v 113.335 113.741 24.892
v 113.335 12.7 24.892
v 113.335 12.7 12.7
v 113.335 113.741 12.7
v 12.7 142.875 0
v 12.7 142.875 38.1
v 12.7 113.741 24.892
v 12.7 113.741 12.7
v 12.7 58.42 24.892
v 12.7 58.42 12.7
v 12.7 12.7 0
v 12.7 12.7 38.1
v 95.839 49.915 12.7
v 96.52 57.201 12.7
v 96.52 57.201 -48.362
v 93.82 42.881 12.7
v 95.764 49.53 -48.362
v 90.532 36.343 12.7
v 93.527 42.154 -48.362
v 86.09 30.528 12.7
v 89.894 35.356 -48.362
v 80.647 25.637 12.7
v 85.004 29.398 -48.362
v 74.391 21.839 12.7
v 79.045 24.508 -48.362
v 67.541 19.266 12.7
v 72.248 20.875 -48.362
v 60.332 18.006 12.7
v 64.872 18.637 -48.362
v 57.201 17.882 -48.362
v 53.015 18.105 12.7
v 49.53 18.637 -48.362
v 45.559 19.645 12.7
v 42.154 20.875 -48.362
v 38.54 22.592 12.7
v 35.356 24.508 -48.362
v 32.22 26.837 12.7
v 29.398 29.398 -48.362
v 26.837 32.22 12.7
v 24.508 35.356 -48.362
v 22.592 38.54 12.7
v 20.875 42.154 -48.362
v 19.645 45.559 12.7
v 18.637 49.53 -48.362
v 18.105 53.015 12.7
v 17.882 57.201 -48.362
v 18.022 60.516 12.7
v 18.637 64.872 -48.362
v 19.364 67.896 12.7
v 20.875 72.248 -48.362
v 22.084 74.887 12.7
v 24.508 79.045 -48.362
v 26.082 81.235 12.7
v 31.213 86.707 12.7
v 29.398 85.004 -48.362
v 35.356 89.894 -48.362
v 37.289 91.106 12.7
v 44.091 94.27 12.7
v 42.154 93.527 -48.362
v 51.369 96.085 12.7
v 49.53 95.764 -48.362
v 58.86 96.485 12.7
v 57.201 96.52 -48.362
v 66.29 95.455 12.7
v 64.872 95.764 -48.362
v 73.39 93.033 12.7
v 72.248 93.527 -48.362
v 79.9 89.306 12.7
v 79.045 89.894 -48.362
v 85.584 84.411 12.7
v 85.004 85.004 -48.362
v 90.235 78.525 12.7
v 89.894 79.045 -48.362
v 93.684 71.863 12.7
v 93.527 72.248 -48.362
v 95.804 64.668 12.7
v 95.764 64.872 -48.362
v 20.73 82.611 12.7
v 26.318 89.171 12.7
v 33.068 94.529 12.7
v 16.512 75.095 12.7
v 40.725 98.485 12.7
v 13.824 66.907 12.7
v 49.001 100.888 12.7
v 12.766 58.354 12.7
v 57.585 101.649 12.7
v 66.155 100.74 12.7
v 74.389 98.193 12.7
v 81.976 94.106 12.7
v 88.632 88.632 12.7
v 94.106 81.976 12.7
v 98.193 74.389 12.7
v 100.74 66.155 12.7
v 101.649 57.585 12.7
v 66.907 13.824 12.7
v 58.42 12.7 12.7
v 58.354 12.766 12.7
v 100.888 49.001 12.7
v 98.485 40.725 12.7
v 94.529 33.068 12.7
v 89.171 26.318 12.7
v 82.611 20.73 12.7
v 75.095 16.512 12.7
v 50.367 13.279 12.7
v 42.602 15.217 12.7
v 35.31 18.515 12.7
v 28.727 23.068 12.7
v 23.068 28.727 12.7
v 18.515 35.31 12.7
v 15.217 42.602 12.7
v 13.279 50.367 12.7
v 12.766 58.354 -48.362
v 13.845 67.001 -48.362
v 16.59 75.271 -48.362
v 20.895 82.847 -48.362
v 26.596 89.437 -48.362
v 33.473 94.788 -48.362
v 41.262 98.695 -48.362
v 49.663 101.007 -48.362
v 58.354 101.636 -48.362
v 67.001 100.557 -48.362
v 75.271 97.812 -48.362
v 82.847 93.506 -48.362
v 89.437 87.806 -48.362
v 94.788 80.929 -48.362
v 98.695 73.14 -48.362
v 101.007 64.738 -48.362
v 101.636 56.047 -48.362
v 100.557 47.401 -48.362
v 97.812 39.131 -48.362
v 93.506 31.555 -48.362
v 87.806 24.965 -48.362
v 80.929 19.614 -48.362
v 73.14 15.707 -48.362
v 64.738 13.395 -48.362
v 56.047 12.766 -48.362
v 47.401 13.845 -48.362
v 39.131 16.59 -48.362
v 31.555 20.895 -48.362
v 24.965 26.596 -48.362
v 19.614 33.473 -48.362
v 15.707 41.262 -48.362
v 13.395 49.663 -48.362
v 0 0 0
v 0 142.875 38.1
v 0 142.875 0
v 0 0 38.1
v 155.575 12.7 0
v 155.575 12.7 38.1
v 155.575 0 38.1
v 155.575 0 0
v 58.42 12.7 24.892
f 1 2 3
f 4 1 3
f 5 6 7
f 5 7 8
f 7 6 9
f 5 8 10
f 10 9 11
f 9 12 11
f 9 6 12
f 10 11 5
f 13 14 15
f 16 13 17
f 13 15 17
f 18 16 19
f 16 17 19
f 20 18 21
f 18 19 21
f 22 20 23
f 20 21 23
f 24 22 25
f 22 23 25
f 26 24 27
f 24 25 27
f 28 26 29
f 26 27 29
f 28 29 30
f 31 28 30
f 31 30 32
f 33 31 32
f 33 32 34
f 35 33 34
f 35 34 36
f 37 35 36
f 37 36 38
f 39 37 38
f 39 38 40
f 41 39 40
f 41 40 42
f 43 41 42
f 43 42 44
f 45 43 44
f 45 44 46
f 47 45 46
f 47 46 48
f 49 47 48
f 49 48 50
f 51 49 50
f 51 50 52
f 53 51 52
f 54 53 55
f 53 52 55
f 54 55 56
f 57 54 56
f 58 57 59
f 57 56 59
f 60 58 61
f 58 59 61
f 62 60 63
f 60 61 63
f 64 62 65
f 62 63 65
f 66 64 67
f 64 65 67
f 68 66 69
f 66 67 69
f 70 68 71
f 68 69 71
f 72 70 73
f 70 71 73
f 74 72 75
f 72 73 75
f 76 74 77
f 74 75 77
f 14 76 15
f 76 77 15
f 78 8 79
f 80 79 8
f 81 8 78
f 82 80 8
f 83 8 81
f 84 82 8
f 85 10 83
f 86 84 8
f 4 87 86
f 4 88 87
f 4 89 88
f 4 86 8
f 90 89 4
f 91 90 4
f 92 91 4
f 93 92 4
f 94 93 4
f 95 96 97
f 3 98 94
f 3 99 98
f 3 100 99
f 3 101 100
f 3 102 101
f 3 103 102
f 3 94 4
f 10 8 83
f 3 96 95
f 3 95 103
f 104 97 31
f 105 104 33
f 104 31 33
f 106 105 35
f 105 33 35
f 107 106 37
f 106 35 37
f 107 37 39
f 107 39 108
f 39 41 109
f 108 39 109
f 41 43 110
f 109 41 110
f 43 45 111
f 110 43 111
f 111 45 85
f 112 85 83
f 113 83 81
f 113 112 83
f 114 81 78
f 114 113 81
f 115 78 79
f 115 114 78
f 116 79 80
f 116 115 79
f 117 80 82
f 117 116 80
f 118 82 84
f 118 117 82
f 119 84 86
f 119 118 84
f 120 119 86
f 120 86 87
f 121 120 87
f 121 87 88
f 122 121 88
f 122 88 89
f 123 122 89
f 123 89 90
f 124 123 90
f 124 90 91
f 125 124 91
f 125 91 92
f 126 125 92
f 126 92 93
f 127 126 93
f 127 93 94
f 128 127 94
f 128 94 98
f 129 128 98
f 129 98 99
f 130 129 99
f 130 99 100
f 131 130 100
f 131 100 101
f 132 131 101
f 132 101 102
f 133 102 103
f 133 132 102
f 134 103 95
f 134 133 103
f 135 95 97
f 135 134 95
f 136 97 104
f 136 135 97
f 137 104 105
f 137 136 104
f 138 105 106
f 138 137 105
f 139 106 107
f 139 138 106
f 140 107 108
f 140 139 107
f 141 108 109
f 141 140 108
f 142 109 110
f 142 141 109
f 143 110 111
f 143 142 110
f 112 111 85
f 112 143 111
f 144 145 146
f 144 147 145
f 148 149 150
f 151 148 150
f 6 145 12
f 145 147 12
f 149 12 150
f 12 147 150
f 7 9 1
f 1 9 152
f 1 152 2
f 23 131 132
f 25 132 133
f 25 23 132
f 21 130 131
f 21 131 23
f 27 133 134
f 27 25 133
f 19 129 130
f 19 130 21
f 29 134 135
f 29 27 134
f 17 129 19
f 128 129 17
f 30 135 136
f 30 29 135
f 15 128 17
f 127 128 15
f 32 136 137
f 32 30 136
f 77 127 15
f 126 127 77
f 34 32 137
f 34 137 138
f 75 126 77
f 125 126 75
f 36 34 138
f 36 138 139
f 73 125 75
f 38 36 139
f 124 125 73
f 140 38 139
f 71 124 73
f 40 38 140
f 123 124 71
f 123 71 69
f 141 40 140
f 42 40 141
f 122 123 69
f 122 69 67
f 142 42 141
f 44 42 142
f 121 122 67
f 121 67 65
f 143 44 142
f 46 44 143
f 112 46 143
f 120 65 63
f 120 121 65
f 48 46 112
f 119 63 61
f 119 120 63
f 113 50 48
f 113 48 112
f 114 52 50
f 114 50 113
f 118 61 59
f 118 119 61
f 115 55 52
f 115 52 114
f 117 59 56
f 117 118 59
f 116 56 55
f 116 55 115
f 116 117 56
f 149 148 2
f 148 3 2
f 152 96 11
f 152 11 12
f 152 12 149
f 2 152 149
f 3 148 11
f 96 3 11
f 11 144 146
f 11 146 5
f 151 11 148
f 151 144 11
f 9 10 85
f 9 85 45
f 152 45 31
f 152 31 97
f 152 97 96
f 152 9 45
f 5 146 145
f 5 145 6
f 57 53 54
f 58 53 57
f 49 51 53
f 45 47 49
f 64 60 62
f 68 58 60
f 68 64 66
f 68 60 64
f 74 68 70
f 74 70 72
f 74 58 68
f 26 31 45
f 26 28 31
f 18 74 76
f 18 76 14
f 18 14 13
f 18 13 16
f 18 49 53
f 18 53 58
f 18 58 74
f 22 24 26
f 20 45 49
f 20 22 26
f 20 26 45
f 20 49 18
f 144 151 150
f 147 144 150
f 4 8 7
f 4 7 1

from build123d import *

# Parameters (mm, degrees)
SKETCH1_W           = 12.7
SKETCH1_H           = 38.1
BOSS_EXTRUDE1_DEPTH = 155.575
SKETCH3_W           = 12.7
SKETCH3_H           = 38.1
BOSS_EXTRUDE2_DEPTH = 130.175
SKETCH4_W           = 100.6348
SKETCH4_H           = 12.192
BOSS_EXTRUDE3_DEPTH = 101.0412
CUT_EXTRUDE2_DEPTH  = 12.192
BOSS_EXTRUDE8_START = 61.0616
SKETCH6_R           = 44.45
SKETCH6_R_2         = 39.3192
BOSS_EXTRUDE8_DEPTH = 61.0616


with BuildPart() as part:
    # Sketch1 → Boss-Extrude1 (new body)
    with BuildSketch(Plane(origin=(0, 0, 0), x_dir=(0, -1, 0), z_dir=(-1, 0, 0))):
        with Locations((-6.35, 19.05)):
            Rectangle(SKETCH1_W, SKETCH1_H)
    extrude(amount=-BOSS_EXTRUDE1_DEPTH)

    # Sketch3 → Boss-Extrude2 (add)
    with BuildSketch(Plane(origin=(0, 12.7, 0), x_dir=(1, 0, 0), z_dir=(0, 1, 0))):
        with Locations((6.35, -19.05)):
            Rectangle(SKETCH3_W, SKETCH3_H)
    extrude(amount=BOSS_EXTRUDE2_DEPTH)

    # Sketch4 → Boss-Extrude3 (add)
    with BuildSketch(Plane(origin=(0, 12.7, 0), x_dir=(1, 0, 0), z_dir=(0, 1, 0))):
        with Locations((63.0174, -18.796)):
            Rectangle(SKETCH4_W, SKETCH4_H)
    extrude(amount=BOSS_EXTRUDE3_DEPTH)

    # Sketch5 → Cut-Extrude2 (cut)
    with BuildSketch(Plane.XY.offset(24.892)):
        Polygon((12.7, 58.42), (58.42, 12.7), (12.7, 12.7), align=None)
    extrude(amount=-CUT_EXTRUDE2_DEPTH, mode=Mode.SUBTRACT)

    # Sketch6 → Boss-Extrude8 (add)
    with BuildSketch(Plane(origin=(0, 0, 12.7), x_dir=(-1, 0, 0), z_dir=(0, 0, -1)).offset(BOSS_EXTRUDE8_START)):
        with Locations(Location((-57.2008, 57.2008, 0), (0, 0, 1.486934097))):
            Circle(SKETCH6_R)
        with Locations(Location((-57.2008, 57.2008, 0), (0, 0, 180))):
            Circle(SKETCH6_R_2, mode=Mode.SUBTRACT)
    extrude(amount=-BOSS_EXTRUDE8_DEPTH)


solid = part.part
